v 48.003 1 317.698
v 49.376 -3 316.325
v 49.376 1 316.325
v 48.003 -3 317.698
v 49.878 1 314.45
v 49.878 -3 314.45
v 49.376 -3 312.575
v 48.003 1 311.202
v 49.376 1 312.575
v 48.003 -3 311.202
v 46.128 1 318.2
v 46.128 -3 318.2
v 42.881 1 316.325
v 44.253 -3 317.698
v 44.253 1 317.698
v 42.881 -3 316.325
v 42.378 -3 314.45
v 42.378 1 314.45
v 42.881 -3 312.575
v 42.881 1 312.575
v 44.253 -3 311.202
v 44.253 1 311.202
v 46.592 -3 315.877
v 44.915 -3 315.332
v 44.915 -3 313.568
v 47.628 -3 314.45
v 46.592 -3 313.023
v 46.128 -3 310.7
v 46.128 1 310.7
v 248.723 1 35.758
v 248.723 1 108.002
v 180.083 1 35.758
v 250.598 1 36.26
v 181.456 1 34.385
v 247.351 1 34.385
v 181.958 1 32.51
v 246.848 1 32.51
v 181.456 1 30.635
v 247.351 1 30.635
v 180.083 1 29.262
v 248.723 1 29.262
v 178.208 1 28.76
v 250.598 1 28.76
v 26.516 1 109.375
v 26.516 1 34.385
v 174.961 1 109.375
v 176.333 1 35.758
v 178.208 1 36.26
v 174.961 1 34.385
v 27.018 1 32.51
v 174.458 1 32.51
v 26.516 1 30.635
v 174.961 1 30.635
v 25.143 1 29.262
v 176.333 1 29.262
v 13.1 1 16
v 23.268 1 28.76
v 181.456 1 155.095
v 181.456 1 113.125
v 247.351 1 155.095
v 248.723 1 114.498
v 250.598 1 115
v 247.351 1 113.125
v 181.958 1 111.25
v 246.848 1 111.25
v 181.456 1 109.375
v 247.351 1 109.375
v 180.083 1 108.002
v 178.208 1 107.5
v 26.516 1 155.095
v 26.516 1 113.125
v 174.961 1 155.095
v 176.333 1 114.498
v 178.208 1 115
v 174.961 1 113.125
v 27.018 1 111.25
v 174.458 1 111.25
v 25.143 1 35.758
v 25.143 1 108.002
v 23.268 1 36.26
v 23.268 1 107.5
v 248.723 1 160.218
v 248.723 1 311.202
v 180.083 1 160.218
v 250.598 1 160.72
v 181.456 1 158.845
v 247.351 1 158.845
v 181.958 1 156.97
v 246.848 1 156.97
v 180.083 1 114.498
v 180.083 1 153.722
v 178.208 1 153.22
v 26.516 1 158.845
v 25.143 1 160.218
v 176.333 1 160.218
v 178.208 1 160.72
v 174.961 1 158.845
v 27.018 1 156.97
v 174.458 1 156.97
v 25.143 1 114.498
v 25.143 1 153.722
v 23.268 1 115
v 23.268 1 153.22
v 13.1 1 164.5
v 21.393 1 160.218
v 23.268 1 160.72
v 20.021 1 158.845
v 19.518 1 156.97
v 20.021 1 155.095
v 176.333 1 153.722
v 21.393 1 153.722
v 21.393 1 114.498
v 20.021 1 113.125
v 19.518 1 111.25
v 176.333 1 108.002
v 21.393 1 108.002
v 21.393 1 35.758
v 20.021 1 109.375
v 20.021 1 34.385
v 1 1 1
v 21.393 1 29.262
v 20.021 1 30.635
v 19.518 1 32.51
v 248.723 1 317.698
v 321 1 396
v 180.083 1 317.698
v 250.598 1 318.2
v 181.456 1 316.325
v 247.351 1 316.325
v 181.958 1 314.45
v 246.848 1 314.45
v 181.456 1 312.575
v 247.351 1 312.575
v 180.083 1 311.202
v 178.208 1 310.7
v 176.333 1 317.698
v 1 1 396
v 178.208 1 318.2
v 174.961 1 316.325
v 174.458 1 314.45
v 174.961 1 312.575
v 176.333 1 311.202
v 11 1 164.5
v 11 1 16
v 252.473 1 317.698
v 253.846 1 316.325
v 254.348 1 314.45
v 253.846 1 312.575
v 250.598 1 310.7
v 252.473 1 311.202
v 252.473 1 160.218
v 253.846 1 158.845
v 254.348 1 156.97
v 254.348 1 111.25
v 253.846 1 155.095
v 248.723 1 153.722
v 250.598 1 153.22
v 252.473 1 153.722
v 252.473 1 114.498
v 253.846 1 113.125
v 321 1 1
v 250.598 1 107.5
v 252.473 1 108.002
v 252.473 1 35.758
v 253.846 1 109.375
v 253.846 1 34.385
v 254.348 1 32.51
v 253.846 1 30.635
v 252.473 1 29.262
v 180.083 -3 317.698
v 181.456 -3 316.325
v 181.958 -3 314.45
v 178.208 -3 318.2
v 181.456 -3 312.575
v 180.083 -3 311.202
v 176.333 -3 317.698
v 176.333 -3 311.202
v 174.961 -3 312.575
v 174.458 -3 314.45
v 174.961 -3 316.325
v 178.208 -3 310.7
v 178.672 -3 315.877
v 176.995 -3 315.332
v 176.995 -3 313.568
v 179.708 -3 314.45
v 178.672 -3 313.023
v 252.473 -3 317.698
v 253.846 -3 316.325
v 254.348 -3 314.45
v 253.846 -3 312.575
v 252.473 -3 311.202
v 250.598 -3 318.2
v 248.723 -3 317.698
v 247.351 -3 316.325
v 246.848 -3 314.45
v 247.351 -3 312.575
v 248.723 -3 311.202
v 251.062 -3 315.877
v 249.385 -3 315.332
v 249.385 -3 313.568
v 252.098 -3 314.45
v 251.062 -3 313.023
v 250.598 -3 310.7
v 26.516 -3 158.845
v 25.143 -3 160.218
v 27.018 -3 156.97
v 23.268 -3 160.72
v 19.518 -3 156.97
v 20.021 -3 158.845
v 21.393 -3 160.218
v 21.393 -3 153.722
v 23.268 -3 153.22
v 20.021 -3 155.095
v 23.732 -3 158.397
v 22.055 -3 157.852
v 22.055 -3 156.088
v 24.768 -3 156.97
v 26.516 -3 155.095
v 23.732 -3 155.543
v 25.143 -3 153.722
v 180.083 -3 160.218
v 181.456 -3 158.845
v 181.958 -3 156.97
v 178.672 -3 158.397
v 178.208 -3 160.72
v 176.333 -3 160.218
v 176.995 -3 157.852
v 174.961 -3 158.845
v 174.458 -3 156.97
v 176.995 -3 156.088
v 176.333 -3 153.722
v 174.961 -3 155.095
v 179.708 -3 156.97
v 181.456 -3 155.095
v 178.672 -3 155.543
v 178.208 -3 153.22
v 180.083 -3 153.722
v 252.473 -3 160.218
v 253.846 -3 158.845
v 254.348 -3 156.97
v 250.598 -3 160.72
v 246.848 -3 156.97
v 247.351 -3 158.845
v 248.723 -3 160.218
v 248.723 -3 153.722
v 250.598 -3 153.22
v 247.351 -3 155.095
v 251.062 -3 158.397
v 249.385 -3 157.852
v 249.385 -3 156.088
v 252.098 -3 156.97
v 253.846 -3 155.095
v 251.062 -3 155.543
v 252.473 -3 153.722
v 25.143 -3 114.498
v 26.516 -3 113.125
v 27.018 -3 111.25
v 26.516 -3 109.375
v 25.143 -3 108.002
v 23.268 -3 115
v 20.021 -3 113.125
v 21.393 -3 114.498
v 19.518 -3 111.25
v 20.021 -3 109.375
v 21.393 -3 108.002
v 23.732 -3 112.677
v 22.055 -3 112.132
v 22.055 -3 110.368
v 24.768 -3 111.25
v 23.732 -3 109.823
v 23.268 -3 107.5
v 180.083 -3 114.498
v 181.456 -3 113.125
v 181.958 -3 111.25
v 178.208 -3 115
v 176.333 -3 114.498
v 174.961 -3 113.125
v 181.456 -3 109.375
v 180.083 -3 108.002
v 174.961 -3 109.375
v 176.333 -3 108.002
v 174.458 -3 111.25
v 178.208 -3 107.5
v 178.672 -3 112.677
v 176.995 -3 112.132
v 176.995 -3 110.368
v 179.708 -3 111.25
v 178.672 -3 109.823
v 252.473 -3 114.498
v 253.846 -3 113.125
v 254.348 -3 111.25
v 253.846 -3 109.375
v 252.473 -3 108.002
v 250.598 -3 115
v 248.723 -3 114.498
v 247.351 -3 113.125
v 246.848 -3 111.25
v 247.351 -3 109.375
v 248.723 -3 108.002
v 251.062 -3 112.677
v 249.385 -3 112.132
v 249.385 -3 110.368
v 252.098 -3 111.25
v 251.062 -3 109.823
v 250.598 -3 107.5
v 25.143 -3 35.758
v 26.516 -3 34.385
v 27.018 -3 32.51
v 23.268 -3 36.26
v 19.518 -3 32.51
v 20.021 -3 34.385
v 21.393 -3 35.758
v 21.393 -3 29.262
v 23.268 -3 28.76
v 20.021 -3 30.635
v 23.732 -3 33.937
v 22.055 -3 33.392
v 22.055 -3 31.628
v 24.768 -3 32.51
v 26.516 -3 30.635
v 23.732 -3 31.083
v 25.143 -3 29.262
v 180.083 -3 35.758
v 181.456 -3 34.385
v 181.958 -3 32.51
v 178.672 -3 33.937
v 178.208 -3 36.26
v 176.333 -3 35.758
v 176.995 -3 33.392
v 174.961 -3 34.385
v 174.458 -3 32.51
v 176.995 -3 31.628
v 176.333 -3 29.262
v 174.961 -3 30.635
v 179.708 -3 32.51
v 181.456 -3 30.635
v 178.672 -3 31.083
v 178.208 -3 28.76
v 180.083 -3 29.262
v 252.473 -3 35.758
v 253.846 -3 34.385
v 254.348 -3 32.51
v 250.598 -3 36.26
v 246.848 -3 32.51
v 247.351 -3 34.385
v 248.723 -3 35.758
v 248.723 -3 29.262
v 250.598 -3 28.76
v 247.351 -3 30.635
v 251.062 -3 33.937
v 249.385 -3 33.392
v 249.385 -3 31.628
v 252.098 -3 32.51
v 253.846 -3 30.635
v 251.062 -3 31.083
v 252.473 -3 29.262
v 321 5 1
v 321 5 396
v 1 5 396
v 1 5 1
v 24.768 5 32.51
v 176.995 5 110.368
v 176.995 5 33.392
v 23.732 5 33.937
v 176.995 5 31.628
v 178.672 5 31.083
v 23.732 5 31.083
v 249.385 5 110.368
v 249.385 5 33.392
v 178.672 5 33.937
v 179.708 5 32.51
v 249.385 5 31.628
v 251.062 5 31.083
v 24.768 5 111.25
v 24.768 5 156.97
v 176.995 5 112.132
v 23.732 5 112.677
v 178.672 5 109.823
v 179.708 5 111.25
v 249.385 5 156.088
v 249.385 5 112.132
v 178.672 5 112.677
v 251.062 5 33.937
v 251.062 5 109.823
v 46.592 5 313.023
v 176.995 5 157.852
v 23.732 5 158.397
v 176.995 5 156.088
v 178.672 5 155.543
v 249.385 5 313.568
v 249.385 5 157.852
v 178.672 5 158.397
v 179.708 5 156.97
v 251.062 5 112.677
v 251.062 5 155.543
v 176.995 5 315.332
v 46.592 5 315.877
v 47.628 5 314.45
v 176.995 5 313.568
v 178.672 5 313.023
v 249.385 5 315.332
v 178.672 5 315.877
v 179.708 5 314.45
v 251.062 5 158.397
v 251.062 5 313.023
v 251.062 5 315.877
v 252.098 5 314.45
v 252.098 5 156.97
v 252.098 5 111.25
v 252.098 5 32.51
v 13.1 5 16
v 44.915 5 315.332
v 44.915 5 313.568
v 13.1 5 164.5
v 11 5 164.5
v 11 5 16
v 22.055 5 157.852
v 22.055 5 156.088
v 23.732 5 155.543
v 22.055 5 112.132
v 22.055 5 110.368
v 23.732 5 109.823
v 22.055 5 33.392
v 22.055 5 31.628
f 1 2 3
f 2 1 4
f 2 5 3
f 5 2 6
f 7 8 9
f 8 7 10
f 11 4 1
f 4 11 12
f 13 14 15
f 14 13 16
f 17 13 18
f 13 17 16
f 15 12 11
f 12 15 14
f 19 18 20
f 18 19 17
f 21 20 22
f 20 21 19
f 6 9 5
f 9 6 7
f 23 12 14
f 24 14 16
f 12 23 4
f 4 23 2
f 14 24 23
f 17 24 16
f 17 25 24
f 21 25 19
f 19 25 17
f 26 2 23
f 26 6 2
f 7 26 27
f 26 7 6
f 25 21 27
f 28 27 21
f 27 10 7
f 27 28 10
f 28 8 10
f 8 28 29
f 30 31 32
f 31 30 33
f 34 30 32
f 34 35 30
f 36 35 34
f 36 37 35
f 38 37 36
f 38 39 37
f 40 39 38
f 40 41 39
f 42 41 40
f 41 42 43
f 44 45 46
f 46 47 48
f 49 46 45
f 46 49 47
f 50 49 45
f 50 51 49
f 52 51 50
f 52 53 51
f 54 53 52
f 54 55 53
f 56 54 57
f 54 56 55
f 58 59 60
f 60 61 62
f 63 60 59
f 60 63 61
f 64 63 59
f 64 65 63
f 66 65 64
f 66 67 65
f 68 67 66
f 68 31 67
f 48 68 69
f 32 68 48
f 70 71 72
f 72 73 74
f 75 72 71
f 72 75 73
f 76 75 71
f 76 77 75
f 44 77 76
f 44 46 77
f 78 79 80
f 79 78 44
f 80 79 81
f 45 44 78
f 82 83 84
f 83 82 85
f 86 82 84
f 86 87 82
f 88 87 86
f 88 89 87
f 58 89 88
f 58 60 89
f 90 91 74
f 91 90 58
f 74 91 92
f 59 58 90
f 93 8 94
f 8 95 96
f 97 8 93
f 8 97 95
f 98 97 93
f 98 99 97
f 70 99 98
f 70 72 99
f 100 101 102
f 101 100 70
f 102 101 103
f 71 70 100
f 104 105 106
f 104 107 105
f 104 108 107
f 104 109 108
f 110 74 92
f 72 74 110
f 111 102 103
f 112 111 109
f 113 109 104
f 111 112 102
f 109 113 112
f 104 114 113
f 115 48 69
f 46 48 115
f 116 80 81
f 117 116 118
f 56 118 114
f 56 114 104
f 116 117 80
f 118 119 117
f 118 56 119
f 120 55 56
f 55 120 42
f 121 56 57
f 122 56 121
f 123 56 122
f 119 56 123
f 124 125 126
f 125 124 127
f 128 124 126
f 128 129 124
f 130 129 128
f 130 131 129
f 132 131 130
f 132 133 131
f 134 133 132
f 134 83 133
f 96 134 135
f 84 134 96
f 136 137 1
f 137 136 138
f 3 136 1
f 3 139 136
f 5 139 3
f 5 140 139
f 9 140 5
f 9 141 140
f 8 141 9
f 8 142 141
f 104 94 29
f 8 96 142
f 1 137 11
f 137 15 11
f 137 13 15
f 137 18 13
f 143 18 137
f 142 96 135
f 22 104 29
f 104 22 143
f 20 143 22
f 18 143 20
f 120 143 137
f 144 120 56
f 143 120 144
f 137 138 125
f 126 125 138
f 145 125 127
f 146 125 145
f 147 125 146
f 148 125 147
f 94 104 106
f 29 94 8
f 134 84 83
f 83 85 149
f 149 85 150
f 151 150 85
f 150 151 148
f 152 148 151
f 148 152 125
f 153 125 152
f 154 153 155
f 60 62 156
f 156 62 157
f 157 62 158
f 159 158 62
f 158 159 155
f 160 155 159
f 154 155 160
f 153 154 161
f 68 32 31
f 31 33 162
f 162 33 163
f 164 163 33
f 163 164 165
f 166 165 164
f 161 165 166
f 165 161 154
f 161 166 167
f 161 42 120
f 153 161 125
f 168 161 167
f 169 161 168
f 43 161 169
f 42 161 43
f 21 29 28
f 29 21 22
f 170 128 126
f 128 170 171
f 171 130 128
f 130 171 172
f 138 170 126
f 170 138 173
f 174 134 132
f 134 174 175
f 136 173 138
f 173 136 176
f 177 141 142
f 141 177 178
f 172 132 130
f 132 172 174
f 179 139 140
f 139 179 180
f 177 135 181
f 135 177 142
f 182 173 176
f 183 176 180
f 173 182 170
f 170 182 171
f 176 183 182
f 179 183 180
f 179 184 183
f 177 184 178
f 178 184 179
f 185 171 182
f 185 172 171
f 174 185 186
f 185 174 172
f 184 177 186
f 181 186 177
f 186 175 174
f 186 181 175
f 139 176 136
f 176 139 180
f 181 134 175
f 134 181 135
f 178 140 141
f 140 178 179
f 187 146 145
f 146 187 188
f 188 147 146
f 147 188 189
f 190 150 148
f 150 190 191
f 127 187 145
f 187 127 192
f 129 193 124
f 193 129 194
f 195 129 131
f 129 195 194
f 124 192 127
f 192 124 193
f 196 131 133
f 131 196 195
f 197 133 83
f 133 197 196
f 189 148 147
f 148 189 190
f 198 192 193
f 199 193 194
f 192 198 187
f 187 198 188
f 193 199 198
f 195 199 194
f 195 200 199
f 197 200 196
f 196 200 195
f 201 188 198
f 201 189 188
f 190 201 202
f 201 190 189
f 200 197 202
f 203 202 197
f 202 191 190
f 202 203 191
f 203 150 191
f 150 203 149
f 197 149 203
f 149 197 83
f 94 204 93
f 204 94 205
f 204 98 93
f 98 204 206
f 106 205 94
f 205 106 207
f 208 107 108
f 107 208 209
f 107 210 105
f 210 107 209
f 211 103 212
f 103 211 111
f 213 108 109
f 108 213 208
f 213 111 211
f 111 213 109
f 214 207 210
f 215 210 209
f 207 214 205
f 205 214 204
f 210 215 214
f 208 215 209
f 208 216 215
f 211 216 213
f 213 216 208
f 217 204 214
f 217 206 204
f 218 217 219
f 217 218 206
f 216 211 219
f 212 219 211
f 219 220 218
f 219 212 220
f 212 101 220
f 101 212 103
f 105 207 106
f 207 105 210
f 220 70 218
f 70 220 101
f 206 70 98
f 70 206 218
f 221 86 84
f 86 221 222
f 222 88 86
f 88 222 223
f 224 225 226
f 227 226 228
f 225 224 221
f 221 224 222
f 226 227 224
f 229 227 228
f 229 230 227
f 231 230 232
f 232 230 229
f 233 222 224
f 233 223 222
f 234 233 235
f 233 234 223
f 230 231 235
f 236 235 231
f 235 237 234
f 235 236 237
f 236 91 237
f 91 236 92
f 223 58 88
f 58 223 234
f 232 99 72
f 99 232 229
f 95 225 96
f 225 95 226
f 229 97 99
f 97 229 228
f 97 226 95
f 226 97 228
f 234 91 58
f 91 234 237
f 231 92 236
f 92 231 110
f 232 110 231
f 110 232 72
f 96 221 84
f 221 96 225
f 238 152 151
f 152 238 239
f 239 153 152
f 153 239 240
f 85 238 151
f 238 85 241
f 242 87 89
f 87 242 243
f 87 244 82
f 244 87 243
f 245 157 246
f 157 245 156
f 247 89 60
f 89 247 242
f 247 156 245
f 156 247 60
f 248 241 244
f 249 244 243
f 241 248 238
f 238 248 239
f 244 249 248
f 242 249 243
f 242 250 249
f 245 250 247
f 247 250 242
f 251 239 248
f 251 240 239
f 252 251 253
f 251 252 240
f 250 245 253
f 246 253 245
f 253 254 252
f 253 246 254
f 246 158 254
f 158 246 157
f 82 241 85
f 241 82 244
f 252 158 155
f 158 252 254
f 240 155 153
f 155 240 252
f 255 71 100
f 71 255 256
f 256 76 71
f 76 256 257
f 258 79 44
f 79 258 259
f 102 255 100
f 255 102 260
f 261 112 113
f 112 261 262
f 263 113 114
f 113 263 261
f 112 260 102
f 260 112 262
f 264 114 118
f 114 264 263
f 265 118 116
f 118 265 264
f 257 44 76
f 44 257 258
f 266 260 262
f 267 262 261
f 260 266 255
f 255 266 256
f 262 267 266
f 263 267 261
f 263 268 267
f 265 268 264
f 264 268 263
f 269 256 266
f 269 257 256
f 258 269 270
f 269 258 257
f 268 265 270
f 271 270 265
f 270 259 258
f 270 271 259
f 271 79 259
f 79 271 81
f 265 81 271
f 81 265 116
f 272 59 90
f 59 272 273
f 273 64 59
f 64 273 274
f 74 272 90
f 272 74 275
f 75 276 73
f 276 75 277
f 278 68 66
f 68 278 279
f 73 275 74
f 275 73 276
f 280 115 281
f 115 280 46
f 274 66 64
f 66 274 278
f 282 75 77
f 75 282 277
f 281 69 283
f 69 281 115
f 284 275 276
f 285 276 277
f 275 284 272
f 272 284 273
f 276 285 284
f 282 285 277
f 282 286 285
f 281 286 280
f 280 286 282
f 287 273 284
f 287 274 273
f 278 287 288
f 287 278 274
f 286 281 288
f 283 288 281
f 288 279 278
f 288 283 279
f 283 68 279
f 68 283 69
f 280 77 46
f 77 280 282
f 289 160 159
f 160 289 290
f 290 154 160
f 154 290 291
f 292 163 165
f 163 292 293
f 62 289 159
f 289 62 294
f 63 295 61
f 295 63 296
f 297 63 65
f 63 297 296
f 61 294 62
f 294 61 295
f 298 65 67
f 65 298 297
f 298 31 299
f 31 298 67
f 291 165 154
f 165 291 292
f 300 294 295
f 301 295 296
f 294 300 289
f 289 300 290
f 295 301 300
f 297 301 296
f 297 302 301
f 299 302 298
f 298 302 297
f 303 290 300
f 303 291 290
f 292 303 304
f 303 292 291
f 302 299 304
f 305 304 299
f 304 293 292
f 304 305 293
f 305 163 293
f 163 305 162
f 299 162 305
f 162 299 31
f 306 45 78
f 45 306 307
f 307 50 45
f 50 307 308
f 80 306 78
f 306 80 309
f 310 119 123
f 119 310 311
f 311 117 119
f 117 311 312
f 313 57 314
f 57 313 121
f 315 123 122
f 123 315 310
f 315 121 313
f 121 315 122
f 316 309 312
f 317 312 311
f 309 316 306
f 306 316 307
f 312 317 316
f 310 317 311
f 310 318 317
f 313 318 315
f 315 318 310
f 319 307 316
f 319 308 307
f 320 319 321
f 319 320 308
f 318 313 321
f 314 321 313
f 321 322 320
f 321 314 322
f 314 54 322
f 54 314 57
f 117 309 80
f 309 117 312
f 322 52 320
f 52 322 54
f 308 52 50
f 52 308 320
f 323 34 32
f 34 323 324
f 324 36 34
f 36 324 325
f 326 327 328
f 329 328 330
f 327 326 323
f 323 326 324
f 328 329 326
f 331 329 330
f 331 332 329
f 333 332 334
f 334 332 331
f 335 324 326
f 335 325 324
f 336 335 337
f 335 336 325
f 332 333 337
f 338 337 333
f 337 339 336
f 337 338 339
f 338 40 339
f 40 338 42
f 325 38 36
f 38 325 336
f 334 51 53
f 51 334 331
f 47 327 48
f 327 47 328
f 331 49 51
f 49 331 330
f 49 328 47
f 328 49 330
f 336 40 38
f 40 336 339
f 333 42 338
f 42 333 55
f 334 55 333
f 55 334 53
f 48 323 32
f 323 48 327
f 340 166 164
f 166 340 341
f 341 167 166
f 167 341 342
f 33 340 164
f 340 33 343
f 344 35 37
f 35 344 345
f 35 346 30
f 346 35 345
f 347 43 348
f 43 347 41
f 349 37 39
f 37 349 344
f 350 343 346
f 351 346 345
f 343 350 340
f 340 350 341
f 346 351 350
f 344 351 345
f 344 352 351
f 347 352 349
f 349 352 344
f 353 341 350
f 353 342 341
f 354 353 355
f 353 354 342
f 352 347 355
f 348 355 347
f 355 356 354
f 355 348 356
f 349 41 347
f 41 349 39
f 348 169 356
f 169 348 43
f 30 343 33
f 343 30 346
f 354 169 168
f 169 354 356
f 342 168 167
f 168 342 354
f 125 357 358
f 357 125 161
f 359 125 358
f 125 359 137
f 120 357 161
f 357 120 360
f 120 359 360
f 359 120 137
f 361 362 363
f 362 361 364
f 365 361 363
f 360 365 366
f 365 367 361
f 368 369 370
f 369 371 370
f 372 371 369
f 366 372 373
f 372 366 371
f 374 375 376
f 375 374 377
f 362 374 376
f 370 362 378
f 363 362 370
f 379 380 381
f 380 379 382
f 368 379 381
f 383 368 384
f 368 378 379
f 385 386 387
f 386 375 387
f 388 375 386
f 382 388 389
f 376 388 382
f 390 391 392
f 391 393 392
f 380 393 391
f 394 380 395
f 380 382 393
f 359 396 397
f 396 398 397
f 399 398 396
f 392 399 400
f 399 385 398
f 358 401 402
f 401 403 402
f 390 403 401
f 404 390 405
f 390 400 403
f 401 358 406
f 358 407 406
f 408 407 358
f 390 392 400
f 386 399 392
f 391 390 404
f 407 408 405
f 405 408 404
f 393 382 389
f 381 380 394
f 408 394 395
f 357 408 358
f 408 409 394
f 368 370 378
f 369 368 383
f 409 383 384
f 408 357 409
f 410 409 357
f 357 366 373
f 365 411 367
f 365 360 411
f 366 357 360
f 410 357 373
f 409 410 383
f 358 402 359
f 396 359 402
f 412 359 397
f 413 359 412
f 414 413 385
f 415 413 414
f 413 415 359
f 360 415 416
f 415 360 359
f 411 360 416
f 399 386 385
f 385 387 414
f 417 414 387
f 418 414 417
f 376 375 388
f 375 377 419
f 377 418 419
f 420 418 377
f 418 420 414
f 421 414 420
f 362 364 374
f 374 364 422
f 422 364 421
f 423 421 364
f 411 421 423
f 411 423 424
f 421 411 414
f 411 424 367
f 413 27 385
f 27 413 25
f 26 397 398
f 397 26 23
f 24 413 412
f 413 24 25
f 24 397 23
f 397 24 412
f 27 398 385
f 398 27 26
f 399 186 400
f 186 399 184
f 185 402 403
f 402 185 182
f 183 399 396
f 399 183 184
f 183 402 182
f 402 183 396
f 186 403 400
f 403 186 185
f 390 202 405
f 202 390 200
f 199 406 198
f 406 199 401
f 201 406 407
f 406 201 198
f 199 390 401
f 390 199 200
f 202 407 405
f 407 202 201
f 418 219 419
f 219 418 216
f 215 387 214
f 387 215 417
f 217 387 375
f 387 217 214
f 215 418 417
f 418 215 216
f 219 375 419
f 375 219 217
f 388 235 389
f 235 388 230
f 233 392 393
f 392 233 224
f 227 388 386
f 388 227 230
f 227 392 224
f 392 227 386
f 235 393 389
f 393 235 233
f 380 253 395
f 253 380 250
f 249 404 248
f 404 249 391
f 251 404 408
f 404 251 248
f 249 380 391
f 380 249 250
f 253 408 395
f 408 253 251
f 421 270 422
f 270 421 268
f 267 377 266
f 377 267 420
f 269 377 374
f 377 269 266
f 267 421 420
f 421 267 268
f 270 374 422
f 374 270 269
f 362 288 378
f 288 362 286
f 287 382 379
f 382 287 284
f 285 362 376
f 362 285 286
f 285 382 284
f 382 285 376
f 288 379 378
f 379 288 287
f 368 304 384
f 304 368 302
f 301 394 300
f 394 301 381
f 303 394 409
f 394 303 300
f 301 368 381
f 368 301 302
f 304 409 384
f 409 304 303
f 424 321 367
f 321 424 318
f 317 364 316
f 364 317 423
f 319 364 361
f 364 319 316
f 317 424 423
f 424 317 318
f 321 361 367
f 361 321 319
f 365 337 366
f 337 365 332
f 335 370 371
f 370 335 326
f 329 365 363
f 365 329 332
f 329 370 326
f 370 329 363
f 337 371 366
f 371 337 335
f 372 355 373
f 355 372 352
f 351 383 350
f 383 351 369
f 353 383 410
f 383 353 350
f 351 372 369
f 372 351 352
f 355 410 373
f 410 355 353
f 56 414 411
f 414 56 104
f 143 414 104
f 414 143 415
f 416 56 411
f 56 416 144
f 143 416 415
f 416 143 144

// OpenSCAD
// Body of ATX Case

atxMountHoles = [
    [0.9, 11.1], [6.1, 11.1], [8.95, 11.1],
    [0.0, 4.9],  [6.1, 4.9],  [8.95, 4.9],
    [0.0, 3.1],  [6.1, 3.1],  [8.95, 3.1],
    [0.0, 0.0],  [6.1, 0.0],  [8.95, 0.0]
];

module atxCylinders(size=3, depth=4) {
    for (i=[0:len(atxMountHoles)-1]) {
        point = atxMountHoles[i];
        translate([22.2682+(point[0]*25.4), 0, 31.51+(point[1]*25.4)]) {
            rotate([90]) cylinder(depth, size/2, size/2);
        }
    }
}

translate([1,1,1]) {
    difference() {
        union() {
            // Base board
            cube([320, 4, 395]);
            
            // ATX Mount points
            atxCylinders(size=7.5, depth=4);
        }
            
        // Holes in base board
        union() {
            // PCIe Backet opening
            translate([10, -1, 15]) {cube([2.1, 6, 148.5]);}
            
            // ATX Mount point holes
            translate([0, 5, 0]) atxCylinders(size=3, depth=10);
        }
    }
}
